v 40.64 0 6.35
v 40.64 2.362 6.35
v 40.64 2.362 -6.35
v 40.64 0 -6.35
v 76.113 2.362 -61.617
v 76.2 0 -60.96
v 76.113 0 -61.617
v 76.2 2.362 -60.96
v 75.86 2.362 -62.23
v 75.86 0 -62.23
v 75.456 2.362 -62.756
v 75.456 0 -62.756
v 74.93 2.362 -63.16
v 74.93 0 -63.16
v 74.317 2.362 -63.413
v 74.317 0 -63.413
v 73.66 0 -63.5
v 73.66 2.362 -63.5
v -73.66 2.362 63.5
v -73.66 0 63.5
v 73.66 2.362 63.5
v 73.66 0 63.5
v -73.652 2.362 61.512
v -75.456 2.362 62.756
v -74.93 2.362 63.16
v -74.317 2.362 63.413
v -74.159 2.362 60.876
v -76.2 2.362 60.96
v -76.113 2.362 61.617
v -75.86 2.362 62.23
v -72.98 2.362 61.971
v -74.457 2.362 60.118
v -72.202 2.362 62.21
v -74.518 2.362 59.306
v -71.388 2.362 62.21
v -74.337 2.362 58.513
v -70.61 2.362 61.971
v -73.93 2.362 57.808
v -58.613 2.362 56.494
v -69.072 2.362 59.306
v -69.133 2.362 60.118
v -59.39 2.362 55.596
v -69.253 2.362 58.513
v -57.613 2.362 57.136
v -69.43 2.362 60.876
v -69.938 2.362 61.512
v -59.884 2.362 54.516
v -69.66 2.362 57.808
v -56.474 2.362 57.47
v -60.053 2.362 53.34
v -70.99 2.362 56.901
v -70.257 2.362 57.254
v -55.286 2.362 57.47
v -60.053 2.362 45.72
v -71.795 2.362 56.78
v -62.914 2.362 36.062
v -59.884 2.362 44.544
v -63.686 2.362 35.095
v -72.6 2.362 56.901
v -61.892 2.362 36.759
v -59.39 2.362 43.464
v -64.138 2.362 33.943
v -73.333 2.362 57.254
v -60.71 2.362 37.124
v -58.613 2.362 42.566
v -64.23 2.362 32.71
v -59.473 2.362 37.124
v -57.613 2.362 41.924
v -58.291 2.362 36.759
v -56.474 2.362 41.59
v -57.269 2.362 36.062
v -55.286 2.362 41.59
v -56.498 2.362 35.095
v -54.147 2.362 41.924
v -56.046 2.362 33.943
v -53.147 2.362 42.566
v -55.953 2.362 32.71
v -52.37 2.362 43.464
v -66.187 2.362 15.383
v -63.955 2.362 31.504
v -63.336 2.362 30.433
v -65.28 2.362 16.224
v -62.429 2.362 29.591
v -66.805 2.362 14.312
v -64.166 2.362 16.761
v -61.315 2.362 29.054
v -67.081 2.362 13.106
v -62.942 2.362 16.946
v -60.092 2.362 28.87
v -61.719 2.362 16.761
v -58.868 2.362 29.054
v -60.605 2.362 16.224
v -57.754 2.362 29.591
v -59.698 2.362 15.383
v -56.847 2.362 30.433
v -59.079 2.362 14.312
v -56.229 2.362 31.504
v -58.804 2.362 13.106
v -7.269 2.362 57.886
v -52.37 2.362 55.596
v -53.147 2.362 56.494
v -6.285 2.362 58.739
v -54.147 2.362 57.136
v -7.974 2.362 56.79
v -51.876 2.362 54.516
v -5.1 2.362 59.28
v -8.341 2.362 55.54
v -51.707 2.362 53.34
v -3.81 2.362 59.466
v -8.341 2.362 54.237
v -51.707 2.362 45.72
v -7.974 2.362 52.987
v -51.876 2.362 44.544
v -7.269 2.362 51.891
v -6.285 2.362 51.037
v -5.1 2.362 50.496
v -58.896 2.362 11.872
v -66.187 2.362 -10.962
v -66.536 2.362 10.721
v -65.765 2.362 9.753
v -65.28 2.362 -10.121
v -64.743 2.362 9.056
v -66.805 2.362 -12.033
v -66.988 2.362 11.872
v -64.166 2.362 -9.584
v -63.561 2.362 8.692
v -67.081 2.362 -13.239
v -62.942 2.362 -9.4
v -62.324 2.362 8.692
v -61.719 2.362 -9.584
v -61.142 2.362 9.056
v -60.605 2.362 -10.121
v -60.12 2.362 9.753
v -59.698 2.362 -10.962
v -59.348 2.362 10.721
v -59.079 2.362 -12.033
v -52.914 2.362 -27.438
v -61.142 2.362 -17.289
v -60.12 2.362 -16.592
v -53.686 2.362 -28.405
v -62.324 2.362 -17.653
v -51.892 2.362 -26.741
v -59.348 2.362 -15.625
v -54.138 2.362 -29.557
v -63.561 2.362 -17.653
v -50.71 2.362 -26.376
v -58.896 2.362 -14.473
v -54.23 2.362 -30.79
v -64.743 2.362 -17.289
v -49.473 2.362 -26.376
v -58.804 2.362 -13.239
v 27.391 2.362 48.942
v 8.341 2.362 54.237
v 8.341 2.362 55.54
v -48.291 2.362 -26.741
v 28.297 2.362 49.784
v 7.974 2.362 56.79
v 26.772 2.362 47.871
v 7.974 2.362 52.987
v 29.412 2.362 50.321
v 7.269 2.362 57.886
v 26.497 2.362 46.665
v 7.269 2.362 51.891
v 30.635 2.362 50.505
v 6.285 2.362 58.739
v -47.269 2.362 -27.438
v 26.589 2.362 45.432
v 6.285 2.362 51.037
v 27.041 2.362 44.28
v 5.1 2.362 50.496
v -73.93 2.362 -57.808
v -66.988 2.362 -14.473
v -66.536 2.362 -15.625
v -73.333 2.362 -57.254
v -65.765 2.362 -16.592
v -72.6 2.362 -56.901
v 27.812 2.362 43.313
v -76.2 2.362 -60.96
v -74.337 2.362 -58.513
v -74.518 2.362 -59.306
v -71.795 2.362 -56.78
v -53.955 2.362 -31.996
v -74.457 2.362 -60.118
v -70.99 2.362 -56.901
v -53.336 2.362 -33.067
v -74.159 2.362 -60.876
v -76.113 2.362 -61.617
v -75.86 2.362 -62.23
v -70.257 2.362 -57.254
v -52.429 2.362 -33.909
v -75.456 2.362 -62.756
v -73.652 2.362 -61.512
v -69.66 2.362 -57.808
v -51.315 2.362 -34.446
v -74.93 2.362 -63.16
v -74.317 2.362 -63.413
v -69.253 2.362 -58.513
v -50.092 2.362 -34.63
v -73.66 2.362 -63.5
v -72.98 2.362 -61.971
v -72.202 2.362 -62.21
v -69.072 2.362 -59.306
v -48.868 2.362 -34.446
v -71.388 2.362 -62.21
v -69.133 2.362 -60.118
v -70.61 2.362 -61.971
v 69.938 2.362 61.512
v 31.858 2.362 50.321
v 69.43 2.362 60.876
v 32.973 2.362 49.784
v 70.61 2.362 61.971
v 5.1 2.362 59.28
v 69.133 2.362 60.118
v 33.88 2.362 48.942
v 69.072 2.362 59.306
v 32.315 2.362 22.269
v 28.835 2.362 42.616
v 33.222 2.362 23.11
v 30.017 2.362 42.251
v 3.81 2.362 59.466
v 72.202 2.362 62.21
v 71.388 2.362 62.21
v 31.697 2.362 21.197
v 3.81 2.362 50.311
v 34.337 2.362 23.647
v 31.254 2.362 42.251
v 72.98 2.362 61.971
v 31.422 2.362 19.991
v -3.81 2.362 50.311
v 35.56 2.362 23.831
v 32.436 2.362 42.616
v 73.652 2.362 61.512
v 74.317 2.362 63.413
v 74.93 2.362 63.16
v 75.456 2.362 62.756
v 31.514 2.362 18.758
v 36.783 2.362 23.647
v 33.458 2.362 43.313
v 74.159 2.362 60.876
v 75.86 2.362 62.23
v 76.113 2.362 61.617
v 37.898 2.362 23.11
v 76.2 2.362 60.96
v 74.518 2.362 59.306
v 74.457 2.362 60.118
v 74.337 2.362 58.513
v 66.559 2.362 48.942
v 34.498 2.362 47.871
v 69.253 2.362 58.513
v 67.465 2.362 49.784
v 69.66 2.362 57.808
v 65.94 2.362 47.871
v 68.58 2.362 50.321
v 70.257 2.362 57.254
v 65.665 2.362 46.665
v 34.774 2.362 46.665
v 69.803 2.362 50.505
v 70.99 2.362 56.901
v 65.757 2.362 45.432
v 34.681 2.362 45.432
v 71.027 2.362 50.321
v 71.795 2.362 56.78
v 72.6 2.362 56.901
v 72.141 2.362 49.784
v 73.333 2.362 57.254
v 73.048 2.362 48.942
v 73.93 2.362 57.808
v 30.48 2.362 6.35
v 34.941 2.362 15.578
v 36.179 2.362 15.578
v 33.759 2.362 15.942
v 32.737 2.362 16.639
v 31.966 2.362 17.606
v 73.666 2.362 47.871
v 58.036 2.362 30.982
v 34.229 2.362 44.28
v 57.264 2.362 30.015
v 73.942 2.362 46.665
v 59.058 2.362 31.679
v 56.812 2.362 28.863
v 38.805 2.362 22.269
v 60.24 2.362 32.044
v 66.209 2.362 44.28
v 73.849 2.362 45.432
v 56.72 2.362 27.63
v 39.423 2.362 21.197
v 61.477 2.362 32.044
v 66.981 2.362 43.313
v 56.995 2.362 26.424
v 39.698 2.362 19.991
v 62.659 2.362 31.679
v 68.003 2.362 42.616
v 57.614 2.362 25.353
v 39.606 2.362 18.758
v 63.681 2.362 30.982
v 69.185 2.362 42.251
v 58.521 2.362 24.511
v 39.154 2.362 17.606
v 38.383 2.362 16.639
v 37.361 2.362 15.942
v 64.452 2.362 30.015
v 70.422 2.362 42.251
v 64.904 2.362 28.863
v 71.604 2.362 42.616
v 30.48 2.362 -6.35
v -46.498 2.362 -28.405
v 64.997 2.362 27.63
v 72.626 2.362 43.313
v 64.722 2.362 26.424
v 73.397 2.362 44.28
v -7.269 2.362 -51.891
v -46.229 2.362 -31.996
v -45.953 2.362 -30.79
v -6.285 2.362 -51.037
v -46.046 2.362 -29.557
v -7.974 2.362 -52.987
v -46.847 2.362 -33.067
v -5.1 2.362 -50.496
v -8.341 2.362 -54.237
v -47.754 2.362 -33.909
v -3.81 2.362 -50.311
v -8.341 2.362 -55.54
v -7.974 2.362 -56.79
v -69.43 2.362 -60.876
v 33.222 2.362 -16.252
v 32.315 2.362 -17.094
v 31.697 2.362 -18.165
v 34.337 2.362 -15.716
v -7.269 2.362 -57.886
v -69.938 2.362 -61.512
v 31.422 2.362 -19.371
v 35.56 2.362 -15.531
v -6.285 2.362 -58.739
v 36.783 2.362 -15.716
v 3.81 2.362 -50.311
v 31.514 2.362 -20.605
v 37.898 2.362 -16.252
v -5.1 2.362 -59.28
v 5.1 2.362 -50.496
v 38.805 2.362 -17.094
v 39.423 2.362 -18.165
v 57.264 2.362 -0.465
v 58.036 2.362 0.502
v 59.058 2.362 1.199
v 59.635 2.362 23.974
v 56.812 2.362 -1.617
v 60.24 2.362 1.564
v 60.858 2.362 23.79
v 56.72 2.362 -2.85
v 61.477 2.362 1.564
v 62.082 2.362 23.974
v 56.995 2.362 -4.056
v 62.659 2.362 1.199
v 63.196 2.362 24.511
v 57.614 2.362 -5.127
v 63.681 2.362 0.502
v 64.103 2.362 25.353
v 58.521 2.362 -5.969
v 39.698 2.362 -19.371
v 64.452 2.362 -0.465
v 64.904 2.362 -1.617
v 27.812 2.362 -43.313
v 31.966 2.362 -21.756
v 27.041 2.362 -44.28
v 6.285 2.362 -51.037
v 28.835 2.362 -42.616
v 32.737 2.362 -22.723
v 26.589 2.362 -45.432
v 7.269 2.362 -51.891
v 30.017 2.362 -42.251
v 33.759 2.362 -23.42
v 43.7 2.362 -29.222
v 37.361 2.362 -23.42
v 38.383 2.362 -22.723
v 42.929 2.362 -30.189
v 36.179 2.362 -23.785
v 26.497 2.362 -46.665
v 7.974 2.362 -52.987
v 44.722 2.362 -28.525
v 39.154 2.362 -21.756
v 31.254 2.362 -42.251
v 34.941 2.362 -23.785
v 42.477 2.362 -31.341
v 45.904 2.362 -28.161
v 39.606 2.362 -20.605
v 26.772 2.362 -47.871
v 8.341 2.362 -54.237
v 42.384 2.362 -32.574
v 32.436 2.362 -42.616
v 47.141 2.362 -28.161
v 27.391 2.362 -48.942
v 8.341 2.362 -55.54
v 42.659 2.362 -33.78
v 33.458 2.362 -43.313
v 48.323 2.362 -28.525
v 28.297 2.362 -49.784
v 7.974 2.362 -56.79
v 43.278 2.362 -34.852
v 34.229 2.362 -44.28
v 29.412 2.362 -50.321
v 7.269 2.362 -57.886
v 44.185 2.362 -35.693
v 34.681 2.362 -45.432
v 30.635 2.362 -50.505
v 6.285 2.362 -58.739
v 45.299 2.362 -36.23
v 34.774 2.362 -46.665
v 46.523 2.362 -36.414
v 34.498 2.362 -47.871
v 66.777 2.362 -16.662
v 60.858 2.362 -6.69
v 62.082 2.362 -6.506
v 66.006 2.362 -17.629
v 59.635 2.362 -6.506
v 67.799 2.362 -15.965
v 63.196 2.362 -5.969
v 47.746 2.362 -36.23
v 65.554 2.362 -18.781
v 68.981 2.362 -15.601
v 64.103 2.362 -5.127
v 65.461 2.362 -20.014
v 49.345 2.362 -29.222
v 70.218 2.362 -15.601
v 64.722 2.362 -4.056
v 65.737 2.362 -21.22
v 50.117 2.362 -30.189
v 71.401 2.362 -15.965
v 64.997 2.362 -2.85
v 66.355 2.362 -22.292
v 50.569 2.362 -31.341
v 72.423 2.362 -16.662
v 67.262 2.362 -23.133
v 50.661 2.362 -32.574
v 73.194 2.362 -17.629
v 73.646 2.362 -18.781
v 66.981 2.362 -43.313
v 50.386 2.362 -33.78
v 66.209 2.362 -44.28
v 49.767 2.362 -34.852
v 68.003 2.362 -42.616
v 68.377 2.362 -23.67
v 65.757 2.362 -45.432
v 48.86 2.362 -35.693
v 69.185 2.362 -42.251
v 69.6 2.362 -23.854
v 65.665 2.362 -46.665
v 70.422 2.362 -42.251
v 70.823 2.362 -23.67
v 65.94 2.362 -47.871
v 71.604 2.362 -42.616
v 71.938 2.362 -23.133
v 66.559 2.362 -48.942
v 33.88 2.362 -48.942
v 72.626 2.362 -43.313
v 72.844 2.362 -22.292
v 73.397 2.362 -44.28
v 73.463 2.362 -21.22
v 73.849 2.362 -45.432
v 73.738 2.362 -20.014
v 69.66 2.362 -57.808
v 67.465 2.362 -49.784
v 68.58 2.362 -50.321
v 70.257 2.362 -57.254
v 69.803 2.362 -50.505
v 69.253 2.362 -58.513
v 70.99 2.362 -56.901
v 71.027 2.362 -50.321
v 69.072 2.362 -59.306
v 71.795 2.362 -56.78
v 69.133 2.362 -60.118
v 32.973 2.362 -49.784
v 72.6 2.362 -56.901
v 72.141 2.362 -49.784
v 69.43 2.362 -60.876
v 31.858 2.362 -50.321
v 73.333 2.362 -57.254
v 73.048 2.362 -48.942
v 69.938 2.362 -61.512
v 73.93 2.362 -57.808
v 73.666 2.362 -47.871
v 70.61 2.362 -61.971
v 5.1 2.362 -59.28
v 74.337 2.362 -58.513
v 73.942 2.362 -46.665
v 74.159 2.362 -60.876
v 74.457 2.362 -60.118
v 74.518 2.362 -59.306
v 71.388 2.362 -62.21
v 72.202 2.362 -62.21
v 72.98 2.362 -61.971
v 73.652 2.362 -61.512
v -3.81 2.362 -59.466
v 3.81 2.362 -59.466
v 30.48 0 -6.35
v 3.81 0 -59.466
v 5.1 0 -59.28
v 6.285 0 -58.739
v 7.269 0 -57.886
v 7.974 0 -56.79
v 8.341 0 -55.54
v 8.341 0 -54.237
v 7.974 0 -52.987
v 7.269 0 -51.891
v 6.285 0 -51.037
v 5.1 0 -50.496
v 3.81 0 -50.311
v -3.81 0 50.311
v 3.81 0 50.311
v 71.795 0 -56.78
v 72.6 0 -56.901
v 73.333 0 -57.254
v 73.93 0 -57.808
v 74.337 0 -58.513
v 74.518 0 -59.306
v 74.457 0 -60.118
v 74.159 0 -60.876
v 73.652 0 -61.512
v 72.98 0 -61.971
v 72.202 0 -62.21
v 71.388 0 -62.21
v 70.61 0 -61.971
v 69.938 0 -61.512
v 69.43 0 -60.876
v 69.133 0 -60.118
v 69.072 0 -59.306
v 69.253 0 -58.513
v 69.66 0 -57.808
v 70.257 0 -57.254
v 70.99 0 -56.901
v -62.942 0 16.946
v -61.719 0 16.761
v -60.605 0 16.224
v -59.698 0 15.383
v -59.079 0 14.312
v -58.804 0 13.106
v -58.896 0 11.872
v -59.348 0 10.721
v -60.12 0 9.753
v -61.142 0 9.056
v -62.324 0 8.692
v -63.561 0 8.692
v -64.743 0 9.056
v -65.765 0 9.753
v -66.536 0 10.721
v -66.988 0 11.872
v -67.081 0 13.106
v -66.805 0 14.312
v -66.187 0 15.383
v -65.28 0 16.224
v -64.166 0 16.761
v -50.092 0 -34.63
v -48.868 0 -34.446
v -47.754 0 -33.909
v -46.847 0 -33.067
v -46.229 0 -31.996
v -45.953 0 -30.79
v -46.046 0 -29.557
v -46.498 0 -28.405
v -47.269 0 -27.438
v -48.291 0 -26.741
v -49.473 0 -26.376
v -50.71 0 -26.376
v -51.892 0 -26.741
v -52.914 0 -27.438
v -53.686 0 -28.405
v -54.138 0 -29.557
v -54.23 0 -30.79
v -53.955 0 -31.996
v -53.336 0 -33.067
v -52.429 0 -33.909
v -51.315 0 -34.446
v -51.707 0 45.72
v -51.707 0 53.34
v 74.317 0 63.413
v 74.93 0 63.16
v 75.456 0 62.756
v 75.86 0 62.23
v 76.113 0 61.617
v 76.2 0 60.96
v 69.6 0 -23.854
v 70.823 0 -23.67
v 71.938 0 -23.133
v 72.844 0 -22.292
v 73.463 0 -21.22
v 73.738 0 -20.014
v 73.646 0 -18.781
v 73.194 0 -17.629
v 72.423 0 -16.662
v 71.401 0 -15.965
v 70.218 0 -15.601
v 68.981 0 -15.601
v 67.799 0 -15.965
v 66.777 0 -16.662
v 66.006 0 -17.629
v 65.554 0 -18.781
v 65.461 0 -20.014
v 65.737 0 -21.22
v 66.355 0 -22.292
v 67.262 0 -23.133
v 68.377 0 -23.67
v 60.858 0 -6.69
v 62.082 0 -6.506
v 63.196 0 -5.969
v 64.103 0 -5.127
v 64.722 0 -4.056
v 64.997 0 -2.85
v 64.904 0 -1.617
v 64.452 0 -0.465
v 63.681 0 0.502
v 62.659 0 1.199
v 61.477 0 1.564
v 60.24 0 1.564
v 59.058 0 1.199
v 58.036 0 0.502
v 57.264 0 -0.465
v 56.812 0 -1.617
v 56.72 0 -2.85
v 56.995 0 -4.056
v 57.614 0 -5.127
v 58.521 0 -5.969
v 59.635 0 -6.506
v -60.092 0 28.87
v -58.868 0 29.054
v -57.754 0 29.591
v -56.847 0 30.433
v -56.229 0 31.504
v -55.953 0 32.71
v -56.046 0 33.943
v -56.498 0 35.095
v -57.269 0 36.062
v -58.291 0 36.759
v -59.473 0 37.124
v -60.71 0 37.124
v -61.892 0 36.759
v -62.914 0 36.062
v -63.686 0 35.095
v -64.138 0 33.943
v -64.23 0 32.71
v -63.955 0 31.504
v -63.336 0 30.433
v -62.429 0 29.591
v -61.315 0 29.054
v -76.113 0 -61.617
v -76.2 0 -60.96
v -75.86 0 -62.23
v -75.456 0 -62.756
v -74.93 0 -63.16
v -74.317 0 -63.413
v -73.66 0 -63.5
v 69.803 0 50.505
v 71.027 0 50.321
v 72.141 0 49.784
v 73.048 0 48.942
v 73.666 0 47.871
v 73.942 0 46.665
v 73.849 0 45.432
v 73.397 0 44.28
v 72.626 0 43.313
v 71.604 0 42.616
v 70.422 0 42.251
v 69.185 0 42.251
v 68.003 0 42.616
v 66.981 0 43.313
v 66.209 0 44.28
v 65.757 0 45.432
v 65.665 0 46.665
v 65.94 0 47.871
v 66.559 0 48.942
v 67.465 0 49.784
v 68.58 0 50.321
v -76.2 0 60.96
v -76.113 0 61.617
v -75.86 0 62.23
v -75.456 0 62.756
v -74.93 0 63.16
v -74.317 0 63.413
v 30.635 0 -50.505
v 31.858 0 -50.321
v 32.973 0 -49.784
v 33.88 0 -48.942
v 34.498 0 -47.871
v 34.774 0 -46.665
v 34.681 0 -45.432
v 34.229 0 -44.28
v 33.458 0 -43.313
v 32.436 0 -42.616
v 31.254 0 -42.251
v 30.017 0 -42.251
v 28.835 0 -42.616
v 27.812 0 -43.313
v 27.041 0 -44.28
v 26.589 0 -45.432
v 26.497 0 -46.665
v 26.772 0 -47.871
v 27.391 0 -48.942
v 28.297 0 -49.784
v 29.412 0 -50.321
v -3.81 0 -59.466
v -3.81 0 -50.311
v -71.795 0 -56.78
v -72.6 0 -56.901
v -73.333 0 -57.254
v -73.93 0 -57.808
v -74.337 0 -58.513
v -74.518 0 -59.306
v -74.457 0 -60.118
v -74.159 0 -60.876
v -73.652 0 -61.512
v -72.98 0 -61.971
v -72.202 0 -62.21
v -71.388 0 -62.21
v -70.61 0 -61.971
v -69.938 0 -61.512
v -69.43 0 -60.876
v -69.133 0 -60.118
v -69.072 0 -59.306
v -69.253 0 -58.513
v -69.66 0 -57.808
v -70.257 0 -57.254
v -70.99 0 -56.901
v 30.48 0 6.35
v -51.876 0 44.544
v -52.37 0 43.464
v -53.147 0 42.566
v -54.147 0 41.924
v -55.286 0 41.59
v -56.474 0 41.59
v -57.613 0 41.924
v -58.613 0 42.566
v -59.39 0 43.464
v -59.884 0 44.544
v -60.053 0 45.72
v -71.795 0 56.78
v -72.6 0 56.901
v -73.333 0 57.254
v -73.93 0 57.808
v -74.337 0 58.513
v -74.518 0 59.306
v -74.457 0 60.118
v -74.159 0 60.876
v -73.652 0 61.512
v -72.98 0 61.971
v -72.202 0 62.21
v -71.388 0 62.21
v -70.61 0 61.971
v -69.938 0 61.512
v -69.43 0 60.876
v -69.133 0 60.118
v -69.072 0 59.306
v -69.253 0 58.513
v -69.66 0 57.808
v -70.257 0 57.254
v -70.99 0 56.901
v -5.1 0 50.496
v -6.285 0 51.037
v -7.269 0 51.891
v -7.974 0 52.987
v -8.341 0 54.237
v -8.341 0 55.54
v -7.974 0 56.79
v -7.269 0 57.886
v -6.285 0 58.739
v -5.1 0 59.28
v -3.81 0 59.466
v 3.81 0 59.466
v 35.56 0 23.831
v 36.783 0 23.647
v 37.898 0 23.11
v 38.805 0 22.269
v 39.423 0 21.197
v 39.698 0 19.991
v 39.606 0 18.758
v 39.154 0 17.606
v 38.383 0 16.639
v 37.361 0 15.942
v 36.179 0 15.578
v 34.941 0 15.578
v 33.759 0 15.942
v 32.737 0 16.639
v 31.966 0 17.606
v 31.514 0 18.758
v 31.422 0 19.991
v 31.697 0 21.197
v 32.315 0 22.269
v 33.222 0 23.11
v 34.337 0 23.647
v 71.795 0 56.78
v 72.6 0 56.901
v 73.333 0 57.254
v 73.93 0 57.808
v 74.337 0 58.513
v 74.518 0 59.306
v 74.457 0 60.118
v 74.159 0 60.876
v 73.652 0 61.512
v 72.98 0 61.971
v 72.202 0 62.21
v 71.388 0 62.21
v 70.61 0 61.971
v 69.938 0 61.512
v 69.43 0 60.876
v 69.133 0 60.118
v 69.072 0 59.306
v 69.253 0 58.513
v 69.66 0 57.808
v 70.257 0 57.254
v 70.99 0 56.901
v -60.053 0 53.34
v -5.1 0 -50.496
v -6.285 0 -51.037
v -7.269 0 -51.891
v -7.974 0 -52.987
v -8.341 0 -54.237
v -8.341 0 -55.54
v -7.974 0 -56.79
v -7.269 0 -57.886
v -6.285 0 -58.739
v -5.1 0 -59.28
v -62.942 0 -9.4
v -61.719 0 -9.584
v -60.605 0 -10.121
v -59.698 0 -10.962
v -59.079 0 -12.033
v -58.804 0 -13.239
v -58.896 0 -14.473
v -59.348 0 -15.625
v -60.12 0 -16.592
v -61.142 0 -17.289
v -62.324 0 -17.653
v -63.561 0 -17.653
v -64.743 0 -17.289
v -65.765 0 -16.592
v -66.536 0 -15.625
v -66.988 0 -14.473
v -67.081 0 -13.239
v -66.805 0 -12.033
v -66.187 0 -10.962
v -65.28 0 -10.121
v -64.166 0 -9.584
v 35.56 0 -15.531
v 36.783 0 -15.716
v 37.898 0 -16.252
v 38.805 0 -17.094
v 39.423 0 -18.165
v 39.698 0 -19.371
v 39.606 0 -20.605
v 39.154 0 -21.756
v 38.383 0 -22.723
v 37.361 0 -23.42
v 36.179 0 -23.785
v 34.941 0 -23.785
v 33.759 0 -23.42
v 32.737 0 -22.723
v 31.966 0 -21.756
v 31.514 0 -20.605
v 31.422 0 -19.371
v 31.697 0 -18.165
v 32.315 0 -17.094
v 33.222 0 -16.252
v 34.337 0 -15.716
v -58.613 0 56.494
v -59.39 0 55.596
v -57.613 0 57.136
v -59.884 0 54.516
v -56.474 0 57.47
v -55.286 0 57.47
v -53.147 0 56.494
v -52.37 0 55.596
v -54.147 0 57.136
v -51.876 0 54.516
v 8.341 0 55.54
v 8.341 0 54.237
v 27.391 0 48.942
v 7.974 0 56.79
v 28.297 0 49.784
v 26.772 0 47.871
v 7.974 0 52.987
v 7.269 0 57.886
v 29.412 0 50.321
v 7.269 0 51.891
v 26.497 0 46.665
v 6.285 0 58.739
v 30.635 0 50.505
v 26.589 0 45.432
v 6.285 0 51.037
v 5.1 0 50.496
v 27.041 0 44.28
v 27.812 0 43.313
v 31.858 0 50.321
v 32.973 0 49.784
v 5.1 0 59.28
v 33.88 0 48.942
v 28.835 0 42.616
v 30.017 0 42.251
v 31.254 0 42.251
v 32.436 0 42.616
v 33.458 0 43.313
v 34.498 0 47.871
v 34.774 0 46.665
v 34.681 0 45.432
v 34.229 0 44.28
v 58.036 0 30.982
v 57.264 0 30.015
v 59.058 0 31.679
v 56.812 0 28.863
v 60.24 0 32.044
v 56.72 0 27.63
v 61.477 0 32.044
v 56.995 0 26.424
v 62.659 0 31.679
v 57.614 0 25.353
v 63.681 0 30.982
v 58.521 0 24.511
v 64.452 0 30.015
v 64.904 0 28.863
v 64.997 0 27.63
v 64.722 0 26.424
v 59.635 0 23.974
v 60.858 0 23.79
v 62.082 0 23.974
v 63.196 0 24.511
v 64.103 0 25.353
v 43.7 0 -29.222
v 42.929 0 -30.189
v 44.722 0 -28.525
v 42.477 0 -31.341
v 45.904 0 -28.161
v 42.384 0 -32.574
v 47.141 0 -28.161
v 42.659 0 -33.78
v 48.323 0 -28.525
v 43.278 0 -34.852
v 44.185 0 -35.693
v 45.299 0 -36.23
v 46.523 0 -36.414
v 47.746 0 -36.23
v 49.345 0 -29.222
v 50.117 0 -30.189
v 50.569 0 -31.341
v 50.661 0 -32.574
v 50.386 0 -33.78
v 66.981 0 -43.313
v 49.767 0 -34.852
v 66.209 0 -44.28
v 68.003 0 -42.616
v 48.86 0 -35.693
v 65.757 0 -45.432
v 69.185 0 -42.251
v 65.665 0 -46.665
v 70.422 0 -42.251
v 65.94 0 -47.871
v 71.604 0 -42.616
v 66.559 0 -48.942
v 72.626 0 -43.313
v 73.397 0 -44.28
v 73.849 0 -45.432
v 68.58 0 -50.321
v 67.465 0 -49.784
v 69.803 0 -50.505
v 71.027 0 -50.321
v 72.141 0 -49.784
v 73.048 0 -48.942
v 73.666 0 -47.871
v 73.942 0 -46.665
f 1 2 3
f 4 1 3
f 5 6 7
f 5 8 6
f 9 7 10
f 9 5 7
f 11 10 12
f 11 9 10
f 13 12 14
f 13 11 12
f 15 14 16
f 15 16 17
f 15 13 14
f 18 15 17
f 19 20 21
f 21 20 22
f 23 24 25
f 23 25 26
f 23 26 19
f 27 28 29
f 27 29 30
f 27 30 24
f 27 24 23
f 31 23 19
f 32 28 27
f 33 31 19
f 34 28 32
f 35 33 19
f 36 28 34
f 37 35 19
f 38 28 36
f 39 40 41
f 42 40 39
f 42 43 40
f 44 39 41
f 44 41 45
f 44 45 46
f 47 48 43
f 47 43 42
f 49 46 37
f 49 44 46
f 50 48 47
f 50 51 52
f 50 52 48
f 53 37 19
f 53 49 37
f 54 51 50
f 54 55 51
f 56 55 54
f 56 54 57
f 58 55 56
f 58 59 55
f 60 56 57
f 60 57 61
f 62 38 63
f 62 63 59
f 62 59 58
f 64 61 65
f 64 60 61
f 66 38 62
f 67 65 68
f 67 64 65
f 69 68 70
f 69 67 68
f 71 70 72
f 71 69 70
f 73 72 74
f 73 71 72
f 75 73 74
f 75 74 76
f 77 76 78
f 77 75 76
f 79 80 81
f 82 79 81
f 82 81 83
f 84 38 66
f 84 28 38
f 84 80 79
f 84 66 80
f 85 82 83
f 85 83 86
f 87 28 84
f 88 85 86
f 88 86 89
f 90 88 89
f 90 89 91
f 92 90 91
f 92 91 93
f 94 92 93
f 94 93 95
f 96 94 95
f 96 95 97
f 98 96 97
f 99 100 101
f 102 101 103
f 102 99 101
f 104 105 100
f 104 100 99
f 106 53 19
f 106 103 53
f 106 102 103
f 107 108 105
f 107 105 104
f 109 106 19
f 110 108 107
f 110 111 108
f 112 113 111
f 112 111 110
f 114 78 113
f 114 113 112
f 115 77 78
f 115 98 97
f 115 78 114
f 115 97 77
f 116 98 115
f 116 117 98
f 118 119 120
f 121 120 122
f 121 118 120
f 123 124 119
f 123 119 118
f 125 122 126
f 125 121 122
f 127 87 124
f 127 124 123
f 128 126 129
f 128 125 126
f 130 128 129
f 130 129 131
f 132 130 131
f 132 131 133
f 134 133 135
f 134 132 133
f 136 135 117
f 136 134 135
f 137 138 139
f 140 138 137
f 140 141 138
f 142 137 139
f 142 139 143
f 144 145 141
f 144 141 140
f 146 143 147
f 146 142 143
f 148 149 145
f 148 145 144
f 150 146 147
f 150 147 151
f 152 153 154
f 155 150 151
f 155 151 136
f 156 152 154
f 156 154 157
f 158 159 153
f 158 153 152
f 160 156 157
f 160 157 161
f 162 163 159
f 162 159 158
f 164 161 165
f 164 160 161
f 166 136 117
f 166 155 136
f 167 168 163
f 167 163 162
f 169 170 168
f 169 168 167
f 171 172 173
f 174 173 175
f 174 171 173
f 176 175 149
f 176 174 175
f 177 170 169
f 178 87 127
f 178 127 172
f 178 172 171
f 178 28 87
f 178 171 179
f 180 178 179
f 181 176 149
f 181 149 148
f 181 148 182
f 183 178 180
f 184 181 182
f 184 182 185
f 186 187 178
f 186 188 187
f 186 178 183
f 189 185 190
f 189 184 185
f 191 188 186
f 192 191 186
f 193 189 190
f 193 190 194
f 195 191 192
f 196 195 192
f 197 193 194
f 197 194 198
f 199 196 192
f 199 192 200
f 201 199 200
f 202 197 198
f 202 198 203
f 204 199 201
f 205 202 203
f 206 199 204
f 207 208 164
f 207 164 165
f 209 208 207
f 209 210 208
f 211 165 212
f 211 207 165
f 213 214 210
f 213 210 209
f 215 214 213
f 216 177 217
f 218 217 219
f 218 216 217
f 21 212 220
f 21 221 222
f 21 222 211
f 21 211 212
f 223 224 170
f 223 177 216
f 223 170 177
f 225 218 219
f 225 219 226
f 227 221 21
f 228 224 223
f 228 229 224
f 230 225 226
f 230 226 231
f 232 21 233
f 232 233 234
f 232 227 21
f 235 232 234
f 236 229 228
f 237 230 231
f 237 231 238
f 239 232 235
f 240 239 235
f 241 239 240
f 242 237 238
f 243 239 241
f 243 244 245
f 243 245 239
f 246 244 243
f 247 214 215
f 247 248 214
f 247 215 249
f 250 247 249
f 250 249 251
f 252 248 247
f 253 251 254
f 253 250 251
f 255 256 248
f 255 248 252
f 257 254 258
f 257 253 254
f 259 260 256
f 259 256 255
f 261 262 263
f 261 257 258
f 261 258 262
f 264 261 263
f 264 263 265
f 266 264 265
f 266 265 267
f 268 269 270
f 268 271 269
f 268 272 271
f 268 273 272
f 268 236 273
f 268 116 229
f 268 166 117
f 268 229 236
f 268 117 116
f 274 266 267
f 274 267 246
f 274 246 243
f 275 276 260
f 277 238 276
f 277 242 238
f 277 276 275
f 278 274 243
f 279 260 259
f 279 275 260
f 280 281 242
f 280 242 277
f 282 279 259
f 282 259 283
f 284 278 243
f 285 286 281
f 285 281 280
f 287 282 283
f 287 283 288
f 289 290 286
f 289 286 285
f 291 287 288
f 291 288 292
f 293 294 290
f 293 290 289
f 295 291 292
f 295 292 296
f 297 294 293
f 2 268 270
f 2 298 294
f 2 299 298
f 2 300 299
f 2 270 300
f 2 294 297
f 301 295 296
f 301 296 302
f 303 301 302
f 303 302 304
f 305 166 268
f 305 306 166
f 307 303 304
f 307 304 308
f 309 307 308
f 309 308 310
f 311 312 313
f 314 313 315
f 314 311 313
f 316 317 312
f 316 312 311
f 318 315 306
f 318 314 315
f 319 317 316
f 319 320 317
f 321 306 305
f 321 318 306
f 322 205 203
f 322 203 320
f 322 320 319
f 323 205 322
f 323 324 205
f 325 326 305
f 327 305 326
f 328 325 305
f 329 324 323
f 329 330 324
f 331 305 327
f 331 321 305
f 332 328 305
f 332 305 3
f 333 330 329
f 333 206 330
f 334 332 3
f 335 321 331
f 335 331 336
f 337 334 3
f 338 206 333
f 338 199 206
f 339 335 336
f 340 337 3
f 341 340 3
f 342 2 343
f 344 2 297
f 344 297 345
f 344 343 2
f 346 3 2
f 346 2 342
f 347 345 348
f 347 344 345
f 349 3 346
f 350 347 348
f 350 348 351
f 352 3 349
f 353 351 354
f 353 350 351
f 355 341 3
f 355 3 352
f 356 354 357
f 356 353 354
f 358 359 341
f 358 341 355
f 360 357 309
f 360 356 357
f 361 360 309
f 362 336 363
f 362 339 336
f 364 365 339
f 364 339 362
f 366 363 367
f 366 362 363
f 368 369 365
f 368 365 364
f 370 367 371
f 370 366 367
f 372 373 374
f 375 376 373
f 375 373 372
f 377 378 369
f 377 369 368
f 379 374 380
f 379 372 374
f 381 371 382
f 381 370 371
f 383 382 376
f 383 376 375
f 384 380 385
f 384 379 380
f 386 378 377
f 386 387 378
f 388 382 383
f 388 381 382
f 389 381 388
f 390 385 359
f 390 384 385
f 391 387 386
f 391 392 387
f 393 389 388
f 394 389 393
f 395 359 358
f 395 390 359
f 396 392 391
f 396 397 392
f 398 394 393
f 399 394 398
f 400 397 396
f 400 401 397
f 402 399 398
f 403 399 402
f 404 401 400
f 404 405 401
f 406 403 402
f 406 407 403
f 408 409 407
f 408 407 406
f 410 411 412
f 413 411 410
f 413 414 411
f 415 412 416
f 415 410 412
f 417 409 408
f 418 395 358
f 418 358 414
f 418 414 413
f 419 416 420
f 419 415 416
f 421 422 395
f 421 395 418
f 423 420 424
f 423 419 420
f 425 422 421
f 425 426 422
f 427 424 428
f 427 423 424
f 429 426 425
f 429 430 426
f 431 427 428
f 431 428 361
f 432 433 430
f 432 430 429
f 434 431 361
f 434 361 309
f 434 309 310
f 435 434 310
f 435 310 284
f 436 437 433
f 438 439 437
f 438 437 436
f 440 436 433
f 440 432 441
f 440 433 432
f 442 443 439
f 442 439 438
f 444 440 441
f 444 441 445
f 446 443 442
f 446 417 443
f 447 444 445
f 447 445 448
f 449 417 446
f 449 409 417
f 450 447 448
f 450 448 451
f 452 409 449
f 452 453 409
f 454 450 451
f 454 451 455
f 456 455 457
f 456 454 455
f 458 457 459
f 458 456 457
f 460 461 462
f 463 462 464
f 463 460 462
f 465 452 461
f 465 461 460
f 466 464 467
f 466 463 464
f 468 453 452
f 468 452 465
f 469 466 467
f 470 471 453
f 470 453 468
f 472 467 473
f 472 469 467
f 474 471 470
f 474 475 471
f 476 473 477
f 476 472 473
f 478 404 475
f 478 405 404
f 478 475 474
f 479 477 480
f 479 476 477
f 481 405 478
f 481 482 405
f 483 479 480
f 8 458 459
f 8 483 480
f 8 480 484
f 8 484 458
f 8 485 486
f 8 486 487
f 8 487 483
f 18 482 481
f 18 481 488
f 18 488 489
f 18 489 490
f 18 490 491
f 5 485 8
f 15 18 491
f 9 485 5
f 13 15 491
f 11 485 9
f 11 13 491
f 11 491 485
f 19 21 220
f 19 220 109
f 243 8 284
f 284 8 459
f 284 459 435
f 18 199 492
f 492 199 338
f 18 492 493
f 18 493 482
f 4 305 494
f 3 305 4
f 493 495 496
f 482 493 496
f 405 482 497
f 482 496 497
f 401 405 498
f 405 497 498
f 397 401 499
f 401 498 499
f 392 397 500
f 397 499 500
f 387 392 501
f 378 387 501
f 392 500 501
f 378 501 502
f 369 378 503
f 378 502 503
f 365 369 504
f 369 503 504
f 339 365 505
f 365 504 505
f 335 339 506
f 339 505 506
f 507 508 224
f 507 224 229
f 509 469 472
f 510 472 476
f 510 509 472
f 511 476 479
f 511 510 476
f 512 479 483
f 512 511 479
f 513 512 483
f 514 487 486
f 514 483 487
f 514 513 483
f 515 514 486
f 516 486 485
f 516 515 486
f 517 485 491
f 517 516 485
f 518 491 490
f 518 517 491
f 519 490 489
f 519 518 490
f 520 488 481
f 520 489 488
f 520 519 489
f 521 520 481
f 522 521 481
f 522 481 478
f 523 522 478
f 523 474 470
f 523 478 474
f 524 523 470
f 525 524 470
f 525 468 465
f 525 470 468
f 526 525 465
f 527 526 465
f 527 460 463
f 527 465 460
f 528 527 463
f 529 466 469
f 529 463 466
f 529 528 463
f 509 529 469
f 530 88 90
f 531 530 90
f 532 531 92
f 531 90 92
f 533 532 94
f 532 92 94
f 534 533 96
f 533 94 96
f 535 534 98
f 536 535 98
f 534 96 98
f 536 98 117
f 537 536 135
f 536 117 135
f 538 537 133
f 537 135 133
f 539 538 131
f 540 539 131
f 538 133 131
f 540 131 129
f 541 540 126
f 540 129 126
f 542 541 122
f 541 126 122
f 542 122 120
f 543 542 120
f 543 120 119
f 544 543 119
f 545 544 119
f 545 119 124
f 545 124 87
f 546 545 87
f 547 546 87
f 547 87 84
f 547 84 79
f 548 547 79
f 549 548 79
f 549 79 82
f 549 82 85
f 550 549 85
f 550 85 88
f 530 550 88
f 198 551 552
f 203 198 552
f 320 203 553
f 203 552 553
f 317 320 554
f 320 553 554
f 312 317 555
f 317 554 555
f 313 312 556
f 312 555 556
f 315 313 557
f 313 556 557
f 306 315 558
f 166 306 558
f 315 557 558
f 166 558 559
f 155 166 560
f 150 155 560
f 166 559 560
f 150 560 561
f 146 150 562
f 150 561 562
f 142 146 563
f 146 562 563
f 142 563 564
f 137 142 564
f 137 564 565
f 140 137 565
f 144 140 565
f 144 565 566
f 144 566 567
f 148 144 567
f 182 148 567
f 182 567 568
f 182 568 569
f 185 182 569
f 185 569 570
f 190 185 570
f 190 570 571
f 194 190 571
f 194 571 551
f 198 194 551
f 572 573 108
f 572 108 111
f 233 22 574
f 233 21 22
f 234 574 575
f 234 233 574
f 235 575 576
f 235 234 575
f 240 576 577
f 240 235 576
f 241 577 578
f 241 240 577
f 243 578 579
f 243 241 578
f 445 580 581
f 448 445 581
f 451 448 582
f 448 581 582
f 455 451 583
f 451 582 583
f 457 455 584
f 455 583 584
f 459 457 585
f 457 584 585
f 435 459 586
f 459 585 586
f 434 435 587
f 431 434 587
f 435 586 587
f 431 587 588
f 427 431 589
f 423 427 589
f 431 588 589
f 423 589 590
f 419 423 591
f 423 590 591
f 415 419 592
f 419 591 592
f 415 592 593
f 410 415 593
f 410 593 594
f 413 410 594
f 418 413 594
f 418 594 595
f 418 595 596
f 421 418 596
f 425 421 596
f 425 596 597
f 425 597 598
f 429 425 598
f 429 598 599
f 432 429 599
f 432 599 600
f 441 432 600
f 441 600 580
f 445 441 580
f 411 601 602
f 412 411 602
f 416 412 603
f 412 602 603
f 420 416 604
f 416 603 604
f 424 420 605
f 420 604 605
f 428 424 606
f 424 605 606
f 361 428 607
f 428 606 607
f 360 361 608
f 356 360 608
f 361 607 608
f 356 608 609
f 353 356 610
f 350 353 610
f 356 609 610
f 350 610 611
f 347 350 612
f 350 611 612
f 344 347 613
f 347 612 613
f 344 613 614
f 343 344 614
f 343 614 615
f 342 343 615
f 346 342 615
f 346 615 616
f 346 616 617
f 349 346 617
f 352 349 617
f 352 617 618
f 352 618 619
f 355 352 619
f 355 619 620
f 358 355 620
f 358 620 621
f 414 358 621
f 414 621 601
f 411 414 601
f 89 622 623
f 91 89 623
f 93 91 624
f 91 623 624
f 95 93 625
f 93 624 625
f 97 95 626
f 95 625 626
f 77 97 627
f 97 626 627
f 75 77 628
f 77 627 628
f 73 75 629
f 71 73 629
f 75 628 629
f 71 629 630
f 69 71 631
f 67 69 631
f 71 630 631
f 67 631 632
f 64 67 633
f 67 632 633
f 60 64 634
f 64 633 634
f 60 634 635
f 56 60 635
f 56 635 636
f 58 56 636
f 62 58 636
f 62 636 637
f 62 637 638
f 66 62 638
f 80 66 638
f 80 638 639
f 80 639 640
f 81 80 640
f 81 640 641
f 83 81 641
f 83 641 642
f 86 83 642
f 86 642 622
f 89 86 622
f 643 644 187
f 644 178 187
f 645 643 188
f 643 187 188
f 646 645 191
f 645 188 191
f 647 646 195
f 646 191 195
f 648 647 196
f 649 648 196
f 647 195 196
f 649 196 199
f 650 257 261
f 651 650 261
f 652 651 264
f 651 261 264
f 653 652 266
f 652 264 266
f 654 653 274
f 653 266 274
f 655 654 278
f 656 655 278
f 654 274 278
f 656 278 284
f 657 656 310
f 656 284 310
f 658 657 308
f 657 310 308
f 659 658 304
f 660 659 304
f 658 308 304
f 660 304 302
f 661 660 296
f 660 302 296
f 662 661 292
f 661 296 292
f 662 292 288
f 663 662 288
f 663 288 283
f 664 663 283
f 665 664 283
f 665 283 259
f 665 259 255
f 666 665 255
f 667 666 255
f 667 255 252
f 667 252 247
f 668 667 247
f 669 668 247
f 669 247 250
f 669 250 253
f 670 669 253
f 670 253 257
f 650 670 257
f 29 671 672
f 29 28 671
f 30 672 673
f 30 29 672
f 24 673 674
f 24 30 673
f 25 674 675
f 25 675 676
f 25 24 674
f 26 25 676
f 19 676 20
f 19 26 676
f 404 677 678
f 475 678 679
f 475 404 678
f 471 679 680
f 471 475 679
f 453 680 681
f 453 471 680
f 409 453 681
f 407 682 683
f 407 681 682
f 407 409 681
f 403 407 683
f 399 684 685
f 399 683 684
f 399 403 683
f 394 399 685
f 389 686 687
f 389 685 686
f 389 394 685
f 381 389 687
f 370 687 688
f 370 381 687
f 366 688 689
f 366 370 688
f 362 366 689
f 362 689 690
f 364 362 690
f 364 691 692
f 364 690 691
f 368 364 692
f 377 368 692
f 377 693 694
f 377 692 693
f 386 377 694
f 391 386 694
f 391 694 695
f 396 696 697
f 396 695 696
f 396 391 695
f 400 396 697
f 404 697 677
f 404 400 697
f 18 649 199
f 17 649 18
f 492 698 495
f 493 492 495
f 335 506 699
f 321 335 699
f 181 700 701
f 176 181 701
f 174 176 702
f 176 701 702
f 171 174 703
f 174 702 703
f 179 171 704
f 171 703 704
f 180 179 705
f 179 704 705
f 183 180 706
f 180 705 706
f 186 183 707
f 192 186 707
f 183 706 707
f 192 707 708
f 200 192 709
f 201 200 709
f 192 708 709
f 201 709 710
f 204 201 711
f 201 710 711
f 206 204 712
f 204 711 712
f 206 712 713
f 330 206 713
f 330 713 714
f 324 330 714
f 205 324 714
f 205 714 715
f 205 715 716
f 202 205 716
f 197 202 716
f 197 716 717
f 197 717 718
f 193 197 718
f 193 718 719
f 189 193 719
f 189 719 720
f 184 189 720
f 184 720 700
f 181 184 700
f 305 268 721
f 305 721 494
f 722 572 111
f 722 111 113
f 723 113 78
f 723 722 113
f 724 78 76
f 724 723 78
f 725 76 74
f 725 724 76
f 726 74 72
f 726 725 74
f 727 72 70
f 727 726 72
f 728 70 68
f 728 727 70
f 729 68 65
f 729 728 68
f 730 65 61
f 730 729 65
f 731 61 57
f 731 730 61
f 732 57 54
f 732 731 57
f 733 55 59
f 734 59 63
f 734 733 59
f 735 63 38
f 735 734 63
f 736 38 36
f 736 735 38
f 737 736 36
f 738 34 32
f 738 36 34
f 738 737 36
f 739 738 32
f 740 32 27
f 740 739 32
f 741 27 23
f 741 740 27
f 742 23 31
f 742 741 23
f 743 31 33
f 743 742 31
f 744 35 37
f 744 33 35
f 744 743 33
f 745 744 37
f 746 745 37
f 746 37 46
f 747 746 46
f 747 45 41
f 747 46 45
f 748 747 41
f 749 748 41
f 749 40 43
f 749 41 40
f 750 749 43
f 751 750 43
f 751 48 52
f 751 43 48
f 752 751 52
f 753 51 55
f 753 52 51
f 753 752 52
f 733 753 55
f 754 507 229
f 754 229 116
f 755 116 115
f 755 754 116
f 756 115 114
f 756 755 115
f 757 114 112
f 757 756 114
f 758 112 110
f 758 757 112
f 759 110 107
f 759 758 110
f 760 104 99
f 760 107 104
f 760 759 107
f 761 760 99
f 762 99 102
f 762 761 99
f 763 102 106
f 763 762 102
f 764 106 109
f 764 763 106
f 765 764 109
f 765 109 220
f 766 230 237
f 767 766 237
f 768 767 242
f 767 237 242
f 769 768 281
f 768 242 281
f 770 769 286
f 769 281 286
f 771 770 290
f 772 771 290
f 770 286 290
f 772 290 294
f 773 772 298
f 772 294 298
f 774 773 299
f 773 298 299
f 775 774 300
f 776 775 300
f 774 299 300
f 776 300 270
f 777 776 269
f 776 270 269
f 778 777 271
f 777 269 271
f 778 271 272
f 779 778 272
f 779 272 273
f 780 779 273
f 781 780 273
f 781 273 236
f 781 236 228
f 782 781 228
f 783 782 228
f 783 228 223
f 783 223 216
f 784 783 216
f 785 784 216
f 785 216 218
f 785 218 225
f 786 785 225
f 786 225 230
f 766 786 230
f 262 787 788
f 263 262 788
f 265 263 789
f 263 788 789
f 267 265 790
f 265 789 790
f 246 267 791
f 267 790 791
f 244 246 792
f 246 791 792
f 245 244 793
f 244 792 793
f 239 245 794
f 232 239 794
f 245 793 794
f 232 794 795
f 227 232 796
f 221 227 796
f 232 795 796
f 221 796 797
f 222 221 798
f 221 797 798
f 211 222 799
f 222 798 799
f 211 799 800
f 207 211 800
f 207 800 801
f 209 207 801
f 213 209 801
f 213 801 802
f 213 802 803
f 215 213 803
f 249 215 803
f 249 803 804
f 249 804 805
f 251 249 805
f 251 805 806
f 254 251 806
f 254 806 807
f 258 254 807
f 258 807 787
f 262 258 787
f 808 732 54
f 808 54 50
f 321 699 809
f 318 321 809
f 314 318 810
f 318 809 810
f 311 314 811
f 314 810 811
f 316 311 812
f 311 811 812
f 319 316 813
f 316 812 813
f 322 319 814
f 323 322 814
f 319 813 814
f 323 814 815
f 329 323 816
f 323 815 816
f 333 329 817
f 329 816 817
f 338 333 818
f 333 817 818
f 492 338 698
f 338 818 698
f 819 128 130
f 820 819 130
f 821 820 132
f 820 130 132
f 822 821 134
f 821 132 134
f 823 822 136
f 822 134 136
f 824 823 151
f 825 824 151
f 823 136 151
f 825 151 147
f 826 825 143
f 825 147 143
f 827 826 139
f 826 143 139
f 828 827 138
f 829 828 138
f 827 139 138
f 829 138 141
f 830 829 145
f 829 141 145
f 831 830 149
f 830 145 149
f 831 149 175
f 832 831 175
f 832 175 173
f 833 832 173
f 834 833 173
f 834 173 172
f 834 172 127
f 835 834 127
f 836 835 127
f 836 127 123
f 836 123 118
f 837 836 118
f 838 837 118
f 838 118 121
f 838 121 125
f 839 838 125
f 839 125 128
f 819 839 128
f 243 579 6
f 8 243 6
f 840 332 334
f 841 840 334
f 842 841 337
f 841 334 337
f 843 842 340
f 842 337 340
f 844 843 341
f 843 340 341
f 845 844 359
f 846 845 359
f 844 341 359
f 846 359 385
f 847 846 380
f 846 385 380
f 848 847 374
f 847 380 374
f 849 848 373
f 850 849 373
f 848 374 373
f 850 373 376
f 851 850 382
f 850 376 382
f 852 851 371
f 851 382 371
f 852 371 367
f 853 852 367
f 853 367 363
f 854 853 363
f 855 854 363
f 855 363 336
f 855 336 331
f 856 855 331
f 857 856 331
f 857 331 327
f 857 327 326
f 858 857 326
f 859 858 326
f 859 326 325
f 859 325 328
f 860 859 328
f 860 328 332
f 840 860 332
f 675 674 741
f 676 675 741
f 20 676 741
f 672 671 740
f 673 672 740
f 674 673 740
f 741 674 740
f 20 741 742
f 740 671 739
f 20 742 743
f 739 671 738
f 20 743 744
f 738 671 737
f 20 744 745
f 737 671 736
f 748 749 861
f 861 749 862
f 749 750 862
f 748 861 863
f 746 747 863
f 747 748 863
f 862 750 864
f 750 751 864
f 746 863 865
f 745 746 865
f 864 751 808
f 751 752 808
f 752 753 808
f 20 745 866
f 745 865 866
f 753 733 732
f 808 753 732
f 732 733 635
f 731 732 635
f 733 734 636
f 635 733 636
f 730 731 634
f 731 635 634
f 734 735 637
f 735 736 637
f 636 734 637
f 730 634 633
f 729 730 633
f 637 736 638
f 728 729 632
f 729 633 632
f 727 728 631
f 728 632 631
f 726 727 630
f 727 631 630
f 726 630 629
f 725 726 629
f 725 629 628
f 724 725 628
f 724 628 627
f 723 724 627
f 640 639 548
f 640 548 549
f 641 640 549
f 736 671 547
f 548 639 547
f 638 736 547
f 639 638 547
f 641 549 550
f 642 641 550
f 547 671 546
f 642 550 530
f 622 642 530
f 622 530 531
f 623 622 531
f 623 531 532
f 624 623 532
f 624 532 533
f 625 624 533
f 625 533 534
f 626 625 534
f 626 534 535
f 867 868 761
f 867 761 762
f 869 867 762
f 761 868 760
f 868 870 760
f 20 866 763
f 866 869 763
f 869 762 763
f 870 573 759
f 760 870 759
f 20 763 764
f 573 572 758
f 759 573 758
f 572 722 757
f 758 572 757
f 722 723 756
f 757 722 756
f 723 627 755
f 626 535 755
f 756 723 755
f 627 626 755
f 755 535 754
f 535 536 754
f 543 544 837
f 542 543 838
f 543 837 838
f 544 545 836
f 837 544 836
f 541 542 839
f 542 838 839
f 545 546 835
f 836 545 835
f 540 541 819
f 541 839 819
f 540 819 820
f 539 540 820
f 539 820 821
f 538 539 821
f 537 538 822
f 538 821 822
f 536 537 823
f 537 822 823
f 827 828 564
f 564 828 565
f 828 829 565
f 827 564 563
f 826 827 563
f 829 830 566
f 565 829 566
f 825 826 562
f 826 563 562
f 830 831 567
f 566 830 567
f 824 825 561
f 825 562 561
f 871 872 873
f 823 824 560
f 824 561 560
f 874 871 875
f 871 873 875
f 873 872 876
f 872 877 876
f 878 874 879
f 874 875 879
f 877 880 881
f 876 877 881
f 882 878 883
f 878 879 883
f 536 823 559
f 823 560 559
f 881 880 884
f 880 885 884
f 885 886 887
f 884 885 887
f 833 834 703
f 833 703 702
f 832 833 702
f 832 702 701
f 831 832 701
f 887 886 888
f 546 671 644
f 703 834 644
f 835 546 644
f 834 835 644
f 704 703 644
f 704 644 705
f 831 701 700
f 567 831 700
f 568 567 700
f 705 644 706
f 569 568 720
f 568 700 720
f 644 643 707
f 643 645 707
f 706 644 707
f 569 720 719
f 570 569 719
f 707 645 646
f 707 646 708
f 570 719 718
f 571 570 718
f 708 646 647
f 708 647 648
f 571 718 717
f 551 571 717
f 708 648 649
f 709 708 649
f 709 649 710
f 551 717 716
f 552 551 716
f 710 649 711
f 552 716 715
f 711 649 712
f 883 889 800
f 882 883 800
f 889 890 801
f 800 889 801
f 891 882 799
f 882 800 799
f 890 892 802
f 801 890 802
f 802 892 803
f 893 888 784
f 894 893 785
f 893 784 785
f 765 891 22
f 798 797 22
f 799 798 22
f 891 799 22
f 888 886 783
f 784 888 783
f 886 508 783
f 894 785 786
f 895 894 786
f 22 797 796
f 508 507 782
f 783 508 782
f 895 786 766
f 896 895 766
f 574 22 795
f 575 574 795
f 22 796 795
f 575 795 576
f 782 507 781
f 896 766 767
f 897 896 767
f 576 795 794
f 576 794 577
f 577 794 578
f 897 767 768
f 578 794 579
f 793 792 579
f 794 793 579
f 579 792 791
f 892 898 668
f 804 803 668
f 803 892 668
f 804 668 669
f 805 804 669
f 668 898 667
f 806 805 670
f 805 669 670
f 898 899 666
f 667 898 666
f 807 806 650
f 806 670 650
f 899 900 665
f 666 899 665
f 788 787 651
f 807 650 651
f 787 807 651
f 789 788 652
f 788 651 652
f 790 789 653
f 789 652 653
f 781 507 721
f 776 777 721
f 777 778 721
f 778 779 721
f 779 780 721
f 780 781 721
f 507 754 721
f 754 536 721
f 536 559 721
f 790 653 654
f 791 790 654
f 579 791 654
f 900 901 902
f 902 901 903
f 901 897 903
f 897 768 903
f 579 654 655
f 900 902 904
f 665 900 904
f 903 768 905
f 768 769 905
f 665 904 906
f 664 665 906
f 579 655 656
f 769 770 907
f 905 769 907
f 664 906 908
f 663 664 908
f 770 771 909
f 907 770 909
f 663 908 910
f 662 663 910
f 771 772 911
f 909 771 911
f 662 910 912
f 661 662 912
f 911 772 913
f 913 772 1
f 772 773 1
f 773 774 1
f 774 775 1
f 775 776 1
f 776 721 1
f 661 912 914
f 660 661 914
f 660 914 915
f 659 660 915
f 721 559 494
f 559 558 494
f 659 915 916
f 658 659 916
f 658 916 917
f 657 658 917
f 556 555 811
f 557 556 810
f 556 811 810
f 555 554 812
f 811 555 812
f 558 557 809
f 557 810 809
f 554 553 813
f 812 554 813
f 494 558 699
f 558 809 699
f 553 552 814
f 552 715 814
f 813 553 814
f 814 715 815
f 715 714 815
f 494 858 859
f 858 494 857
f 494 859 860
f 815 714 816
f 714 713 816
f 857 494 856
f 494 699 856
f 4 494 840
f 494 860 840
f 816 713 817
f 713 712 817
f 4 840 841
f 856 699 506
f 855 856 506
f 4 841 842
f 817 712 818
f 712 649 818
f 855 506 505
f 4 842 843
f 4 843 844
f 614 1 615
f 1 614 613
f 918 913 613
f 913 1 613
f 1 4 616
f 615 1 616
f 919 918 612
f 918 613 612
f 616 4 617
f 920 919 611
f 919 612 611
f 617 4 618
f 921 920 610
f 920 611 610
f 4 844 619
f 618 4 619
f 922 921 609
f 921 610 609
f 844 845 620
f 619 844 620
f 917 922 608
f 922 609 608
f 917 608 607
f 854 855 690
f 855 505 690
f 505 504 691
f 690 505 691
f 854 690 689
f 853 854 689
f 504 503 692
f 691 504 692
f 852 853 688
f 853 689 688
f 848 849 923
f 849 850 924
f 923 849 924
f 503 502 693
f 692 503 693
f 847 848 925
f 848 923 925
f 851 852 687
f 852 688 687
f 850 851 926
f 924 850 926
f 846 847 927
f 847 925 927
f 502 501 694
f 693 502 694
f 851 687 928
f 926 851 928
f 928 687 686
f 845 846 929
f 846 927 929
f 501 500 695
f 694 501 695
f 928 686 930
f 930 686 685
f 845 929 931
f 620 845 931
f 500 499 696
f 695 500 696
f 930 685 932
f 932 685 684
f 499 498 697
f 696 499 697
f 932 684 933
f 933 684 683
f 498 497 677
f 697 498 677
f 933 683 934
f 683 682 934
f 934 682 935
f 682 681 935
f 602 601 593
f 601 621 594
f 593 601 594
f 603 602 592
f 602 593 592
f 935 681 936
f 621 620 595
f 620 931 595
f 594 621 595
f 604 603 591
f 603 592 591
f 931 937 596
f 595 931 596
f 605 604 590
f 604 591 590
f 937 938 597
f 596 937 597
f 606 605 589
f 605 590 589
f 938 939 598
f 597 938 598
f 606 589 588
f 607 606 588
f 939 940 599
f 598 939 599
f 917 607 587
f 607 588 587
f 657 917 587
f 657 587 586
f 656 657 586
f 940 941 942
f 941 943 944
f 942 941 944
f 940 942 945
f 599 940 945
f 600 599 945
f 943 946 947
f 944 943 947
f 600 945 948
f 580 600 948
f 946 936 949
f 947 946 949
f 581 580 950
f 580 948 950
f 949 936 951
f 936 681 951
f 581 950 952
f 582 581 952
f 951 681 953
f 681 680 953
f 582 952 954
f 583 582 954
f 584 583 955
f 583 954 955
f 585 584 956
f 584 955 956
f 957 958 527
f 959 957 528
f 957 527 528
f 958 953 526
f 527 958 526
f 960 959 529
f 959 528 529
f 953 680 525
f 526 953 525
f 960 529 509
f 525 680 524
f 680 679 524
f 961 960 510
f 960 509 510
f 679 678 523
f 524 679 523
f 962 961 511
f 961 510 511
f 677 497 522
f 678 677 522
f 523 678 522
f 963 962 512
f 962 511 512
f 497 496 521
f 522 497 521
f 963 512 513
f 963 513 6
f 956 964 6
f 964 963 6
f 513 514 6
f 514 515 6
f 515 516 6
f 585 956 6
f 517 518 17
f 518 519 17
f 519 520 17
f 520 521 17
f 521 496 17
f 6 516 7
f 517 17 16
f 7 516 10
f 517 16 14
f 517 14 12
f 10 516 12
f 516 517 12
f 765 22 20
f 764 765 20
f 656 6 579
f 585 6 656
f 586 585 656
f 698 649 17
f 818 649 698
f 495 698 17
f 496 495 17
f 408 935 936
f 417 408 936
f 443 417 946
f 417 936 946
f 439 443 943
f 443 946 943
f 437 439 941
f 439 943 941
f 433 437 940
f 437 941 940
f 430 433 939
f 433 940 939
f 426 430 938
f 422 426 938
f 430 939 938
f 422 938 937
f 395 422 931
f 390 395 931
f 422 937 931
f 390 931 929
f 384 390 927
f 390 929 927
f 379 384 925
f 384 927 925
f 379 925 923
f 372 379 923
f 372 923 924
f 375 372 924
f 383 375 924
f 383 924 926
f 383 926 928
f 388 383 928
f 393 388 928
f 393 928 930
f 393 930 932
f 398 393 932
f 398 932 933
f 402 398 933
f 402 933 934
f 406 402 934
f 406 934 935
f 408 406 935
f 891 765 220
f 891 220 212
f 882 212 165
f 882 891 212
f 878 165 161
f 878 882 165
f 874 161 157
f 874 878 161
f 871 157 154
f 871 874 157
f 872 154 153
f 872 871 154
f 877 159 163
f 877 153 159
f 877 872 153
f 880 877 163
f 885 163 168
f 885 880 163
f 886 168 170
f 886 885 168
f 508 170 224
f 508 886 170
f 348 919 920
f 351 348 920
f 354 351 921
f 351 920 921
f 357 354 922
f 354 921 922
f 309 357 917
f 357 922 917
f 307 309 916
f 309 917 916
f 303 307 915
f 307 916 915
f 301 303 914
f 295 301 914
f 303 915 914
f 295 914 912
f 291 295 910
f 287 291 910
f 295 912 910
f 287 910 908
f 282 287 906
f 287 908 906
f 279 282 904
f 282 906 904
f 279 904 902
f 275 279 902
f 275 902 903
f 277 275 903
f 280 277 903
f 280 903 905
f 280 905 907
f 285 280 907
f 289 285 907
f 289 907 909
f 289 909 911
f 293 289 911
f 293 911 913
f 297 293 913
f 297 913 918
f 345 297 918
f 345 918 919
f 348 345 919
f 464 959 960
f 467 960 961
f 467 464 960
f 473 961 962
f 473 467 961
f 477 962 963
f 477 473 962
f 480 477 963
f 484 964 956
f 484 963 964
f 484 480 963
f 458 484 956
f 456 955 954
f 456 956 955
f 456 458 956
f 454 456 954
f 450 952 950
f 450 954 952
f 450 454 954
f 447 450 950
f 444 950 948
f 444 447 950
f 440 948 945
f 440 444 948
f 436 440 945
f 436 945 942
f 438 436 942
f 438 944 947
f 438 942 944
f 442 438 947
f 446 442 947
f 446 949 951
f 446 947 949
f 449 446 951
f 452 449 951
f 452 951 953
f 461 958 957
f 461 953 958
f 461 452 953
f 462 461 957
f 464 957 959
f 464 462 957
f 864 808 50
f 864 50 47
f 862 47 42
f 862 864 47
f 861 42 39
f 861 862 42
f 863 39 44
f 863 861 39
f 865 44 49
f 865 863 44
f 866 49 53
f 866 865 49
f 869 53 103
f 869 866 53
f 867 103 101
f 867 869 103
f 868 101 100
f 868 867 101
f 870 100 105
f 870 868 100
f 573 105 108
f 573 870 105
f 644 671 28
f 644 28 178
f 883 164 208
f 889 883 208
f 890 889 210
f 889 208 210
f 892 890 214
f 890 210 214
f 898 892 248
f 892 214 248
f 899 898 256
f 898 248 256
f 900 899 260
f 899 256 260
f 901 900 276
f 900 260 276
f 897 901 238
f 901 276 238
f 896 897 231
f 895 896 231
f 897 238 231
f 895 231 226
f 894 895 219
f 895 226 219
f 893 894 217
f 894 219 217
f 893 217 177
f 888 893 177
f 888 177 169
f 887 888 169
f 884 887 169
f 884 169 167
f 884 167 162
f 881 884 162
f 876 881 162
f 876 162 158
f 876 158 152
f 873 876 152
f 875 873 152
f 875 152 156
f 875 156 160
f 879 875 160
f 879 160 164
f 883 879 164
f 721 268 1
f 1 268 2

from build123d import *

# Parameters (mm, degrees)
SKETCH1_W               = 152.4
SKETCH1_H               = 127
BOSS_EXTRUDE1_DEPTH     = 2.3622
FILLET1_R               = 2.54
SKETCH9_R               = 4.15
CUT_EXTRUDE8_DEPTH      = 100.218294628
CUT_EXTRUDE11_DEPTH     = 100.218294628
CUT_EXTRUDE12_DEPTH     = 100.218294628
SKETCH16_R              = 4.15
CUT_EXTRUDE14_DEPTH     = 100.218294628
SKETCH17_R              = 2.7305
CUT_EXTRUDE16_DEPTH     = 100.218294628
MIRROR7_COPY_1_SKETCH_R = 2.7305
MIRROR7_COPY_1_DEPTH    = 100.218294628
SKETCH26_W              = 10.16
SKETCH26_H              = 12.7
CUT_EXTRUDE26_DEPTH     = 100.218294628
SKETCH27_R              = 4.15
CUT_EXTRUDE27_DEPTH     = 100.218294628
SKETCH29_R              = 4.15
CUT_EXTRUDE28_DEPTH     = 100.218294628
SKETCH30_R              = 4.15
CUT_EXTRUDE29_DEPTH     = 100.218294628
SKETCH31_R              = 4.15
CUT_EXTRUDE30_DEPTH     = 100.218294628


with BuildPart() as part:
    # Sketch1 → Boss-Extrude1 (new body)
    with BuildSketch(Plane(origin=(0, 0, 0), x_dir=(1, 0, 0), z_dir=(0, 1, 0))):
        Rectangle(SKETCH1_W, SKETCH1_H)
    extrude(amount=BOSS_EXTRUDE1_DEPTH)

    # Fillet1
    fillet1_edges = [part.edges().sort_by_distance(p)[0] for p in [
        (76.2, 1.1811, 63.5),
        (-76.2, 1.1811, 63.5),
        (-76.2, 1.1811, -63.5),
        (76.2, 1.1811, -63.5),
    ]]
    fillet(fillet1_edges, radius=FILLET1_R)

    # Sketch9 → Cut-Extrude8 (cut, through all)
    with BuildSketch(Plane.XZ):
        with Locations(Location((60.8584, 27.94, 0), (0, 0, 270))):
            Circle(SKETCH9_R)
        with Locations(Location((60.8584, -2.54, 0), (0, 0, 270))):
            Circle(SKETCH9_R)
    extrude(amount=-CUT_EXTRUDE8_DEPTH, mode=Mode.SUBTRACT)

    # Sketch12 → Cut-Extrude11 (cut, through all)
    with BuildSketch(Plane.XZ):
        with BuildLine():
            Line((-3.81, 59.465627528), (3.81, 59.465627528))
            ThreePointArc((3.81, 59.465627528), (8.387405636, 54.888221892), (3.81, 50.310816255))
            Line((3.81, 50.310816255), (-3.81, 50.310816255))
            ThreePointArc((-3.81, 50.310816255), (-8.387405636, 54.888221892), (-3.81, 59.465627528))
        make_face()
    cut_extrude11 = extrude(amount=-CUT_EXTRUDE11_DEPTH, mode=Mode.SUBTRACT)

    # Mirror3: Cut-Extrude11 across plane
    add(cut_extrude11.mirror(Plane.XY), mode=Mode.SUBTRACT)

    # Sketch13 → Cut-Extrude12 (cut, through all)
    with BuildSketch(Plane(origin=(0, 0, 0), x_dir=(-1, 0, 0), z_dir=(0, -1, 0))):
        with BuildLine():
            Line((60.052874771, -45.72), (60.052874771, -53.34))
            ThreePointArc((60.052874771, -53.34), (55.88, -57.512874771), (51.707125229, -53.34))
            Line((51.707125229, -53.34), (51.707125229, -45.72))
            ThreePointArc((51.707125229, -45.72), (55.88, -41.547125229), (60.052874771, -45.72))
        make_face()
    extrude(amount=-CUT_EXTRUDE12_DEPTH, mode=Mode.SUBTRACT)

    # Sketch16 → Cut-Extrude14 (cut, through all)
    with BuildSketch(Plane(origin=(0, 0, 0), x_dir=(-1, 0, 0), z_dir=(0, -1, 0))):
        with Locations(Location((-69.599893995, 19.704320306, 0), (0, 0, 90))):
            Circle(SKETCH16_R)
        with Locations(Location((-46.522565834, 32.264238523, 0), (0, 0, 90))):
            Circle(SKETCH16_R)
    extrude(amount=-CUT_EXTRUDE14_DEPTH, mode=Mode.SUBTRACT)

    # Sketch17 → Cut-Extrude16 (cut, through all)
    with BuildSketch(Plane.XZ):
        with Locations(Location((71.794813785, 59.510435834, 0), (0, 0, 270))):
            Circle(SKETCH17_R)
    cut_extrude16 = extrude(amount=-CUT_EXTRUDE16_DEPTH, mode=Mode.SUBTRACT)

    # Mirror6: Cut-Extrude16 across plane
    add(cut_extrude16.mirror(Plane(origin=(0, 0, 0), x_dir=(0, 0, 1), z_dir=(1, 0, 0))), mode=Mode.SUBTRACT)

    # Mirror7: Cut-Extrude16 across plane
    add(cut_extrude16.mirror(Plane.XY), mode=Mode.SUBTRACT)

    # Mirror7 copy 1 sketch → Mirror7 copy 1 (cut, through all)
    with BuildSketch(Plane(origin=(0, 0, 0), x_dir=(-1, 0, 0), z_dir=(0, -1, 0))):
        with Locations(Location((71.794813785, 59.510435834, 0), (0, 0, 270))):
            Circle(MIRROR7_COPY_1_SKETCH_R)
    extrude(amount=-MIRROR7_COPY_1_DEPTH, mode=Mode.SUBTRACT)

    # Sketch26 → Cut-Extrude26 (cut, through all)
    with BuildSketch(Plane(origin=(0, 2.3622, 0), x_dir=(1, 0, 0), z_dir=(0, 1, 0))):
        with Locations((35.56, 0)):
            Rectangle(SKETCH26_W, SKETCH26_H)
    extrude(amount=-CUT_EXTRUDE26_DEPTH, mode=Mode.SUBTRACT)

    # Sketch27 → Cut-Extrude27 (cut, through all)
    with BuildSketch(Plane.XZ):
        with Locations(Location((-60.09170874, 33.02, 0), (0, 0, 270))):
            Circle(SKETCH27_R)
        with Locations(Location((-50.09170874, -30.48, 0), (0, 0, 270))):
            Circle(SKETCH27_R)
    extrude(amount=-CUT_EXTRUDE27_DEPTH, mode=Mode.SUBTRACT)

    # Sketch29 → Cut-Extrude28 (cut, through all)
    with BuildSketch(Plane(origin=(0, 2.3622, 0), x_dir=(1, 0, 0), z_dir=(0, 1, 0))):
        with Locations(Location((35.56, 19.681240592, 0), (0, 0, 270))):
            Circle(SKETCH29_R)
        with Locations(Location((35.56, -19.681240592, 0), (0, 0, 270))):
            Circle(SKETCH29_R)
    extrude(amount=-CUT_EXTRUDE28_DEPTH, mode=Mode.SUBTRACT)

    # Sketch30 → Cut-Extrude29 (cut, through all)
    with BuildSketch(Plane(origin=(0, 2.3622, 0), x_dir=(1, 0, 0), z_dir=(0, 1, 0))):
        with Locations(Location((69.803274088, -46.355, 0), (0, 0, 270))):
            Circle(SKETCH30_R)
        with Locations(Location((30.63517528, -46.355, 0), (0, 0, 270))):
            Circle(SKETCH30_R)
    cut_extrude29 = extrude(amount=-CUT_EXTRUDE29_DEPTH, mode=Mode.SUBTRACT)

    # Mirror8: Cut-Extrude29 across plane
    add(cut_extrude29.mirror(Plane.XY), mode=Mode.SUBTRACT)

    # Sketch31 → Cut-Extrude30 (cut, through all)
    with BuildSketch(Plane(origin=(0, 2.3622, 0), x_dir=(1, 0, 0), z_dir=(0, 1, 0))):
        with Locations(Location((-62.942335235, -12.79551579, 0), (0, 0, 270))):
            Circle(SKETCH31_R)
        with Locations(Location((-62.942335235, 13.549600091, 0), (0, 0, 270))):
            Circle(SKETCH31_R)
    extrude(amount=-CUT_EXTRUDE30_DEPTH, mode=Mode.SUBTRACT)


solid = part.part
